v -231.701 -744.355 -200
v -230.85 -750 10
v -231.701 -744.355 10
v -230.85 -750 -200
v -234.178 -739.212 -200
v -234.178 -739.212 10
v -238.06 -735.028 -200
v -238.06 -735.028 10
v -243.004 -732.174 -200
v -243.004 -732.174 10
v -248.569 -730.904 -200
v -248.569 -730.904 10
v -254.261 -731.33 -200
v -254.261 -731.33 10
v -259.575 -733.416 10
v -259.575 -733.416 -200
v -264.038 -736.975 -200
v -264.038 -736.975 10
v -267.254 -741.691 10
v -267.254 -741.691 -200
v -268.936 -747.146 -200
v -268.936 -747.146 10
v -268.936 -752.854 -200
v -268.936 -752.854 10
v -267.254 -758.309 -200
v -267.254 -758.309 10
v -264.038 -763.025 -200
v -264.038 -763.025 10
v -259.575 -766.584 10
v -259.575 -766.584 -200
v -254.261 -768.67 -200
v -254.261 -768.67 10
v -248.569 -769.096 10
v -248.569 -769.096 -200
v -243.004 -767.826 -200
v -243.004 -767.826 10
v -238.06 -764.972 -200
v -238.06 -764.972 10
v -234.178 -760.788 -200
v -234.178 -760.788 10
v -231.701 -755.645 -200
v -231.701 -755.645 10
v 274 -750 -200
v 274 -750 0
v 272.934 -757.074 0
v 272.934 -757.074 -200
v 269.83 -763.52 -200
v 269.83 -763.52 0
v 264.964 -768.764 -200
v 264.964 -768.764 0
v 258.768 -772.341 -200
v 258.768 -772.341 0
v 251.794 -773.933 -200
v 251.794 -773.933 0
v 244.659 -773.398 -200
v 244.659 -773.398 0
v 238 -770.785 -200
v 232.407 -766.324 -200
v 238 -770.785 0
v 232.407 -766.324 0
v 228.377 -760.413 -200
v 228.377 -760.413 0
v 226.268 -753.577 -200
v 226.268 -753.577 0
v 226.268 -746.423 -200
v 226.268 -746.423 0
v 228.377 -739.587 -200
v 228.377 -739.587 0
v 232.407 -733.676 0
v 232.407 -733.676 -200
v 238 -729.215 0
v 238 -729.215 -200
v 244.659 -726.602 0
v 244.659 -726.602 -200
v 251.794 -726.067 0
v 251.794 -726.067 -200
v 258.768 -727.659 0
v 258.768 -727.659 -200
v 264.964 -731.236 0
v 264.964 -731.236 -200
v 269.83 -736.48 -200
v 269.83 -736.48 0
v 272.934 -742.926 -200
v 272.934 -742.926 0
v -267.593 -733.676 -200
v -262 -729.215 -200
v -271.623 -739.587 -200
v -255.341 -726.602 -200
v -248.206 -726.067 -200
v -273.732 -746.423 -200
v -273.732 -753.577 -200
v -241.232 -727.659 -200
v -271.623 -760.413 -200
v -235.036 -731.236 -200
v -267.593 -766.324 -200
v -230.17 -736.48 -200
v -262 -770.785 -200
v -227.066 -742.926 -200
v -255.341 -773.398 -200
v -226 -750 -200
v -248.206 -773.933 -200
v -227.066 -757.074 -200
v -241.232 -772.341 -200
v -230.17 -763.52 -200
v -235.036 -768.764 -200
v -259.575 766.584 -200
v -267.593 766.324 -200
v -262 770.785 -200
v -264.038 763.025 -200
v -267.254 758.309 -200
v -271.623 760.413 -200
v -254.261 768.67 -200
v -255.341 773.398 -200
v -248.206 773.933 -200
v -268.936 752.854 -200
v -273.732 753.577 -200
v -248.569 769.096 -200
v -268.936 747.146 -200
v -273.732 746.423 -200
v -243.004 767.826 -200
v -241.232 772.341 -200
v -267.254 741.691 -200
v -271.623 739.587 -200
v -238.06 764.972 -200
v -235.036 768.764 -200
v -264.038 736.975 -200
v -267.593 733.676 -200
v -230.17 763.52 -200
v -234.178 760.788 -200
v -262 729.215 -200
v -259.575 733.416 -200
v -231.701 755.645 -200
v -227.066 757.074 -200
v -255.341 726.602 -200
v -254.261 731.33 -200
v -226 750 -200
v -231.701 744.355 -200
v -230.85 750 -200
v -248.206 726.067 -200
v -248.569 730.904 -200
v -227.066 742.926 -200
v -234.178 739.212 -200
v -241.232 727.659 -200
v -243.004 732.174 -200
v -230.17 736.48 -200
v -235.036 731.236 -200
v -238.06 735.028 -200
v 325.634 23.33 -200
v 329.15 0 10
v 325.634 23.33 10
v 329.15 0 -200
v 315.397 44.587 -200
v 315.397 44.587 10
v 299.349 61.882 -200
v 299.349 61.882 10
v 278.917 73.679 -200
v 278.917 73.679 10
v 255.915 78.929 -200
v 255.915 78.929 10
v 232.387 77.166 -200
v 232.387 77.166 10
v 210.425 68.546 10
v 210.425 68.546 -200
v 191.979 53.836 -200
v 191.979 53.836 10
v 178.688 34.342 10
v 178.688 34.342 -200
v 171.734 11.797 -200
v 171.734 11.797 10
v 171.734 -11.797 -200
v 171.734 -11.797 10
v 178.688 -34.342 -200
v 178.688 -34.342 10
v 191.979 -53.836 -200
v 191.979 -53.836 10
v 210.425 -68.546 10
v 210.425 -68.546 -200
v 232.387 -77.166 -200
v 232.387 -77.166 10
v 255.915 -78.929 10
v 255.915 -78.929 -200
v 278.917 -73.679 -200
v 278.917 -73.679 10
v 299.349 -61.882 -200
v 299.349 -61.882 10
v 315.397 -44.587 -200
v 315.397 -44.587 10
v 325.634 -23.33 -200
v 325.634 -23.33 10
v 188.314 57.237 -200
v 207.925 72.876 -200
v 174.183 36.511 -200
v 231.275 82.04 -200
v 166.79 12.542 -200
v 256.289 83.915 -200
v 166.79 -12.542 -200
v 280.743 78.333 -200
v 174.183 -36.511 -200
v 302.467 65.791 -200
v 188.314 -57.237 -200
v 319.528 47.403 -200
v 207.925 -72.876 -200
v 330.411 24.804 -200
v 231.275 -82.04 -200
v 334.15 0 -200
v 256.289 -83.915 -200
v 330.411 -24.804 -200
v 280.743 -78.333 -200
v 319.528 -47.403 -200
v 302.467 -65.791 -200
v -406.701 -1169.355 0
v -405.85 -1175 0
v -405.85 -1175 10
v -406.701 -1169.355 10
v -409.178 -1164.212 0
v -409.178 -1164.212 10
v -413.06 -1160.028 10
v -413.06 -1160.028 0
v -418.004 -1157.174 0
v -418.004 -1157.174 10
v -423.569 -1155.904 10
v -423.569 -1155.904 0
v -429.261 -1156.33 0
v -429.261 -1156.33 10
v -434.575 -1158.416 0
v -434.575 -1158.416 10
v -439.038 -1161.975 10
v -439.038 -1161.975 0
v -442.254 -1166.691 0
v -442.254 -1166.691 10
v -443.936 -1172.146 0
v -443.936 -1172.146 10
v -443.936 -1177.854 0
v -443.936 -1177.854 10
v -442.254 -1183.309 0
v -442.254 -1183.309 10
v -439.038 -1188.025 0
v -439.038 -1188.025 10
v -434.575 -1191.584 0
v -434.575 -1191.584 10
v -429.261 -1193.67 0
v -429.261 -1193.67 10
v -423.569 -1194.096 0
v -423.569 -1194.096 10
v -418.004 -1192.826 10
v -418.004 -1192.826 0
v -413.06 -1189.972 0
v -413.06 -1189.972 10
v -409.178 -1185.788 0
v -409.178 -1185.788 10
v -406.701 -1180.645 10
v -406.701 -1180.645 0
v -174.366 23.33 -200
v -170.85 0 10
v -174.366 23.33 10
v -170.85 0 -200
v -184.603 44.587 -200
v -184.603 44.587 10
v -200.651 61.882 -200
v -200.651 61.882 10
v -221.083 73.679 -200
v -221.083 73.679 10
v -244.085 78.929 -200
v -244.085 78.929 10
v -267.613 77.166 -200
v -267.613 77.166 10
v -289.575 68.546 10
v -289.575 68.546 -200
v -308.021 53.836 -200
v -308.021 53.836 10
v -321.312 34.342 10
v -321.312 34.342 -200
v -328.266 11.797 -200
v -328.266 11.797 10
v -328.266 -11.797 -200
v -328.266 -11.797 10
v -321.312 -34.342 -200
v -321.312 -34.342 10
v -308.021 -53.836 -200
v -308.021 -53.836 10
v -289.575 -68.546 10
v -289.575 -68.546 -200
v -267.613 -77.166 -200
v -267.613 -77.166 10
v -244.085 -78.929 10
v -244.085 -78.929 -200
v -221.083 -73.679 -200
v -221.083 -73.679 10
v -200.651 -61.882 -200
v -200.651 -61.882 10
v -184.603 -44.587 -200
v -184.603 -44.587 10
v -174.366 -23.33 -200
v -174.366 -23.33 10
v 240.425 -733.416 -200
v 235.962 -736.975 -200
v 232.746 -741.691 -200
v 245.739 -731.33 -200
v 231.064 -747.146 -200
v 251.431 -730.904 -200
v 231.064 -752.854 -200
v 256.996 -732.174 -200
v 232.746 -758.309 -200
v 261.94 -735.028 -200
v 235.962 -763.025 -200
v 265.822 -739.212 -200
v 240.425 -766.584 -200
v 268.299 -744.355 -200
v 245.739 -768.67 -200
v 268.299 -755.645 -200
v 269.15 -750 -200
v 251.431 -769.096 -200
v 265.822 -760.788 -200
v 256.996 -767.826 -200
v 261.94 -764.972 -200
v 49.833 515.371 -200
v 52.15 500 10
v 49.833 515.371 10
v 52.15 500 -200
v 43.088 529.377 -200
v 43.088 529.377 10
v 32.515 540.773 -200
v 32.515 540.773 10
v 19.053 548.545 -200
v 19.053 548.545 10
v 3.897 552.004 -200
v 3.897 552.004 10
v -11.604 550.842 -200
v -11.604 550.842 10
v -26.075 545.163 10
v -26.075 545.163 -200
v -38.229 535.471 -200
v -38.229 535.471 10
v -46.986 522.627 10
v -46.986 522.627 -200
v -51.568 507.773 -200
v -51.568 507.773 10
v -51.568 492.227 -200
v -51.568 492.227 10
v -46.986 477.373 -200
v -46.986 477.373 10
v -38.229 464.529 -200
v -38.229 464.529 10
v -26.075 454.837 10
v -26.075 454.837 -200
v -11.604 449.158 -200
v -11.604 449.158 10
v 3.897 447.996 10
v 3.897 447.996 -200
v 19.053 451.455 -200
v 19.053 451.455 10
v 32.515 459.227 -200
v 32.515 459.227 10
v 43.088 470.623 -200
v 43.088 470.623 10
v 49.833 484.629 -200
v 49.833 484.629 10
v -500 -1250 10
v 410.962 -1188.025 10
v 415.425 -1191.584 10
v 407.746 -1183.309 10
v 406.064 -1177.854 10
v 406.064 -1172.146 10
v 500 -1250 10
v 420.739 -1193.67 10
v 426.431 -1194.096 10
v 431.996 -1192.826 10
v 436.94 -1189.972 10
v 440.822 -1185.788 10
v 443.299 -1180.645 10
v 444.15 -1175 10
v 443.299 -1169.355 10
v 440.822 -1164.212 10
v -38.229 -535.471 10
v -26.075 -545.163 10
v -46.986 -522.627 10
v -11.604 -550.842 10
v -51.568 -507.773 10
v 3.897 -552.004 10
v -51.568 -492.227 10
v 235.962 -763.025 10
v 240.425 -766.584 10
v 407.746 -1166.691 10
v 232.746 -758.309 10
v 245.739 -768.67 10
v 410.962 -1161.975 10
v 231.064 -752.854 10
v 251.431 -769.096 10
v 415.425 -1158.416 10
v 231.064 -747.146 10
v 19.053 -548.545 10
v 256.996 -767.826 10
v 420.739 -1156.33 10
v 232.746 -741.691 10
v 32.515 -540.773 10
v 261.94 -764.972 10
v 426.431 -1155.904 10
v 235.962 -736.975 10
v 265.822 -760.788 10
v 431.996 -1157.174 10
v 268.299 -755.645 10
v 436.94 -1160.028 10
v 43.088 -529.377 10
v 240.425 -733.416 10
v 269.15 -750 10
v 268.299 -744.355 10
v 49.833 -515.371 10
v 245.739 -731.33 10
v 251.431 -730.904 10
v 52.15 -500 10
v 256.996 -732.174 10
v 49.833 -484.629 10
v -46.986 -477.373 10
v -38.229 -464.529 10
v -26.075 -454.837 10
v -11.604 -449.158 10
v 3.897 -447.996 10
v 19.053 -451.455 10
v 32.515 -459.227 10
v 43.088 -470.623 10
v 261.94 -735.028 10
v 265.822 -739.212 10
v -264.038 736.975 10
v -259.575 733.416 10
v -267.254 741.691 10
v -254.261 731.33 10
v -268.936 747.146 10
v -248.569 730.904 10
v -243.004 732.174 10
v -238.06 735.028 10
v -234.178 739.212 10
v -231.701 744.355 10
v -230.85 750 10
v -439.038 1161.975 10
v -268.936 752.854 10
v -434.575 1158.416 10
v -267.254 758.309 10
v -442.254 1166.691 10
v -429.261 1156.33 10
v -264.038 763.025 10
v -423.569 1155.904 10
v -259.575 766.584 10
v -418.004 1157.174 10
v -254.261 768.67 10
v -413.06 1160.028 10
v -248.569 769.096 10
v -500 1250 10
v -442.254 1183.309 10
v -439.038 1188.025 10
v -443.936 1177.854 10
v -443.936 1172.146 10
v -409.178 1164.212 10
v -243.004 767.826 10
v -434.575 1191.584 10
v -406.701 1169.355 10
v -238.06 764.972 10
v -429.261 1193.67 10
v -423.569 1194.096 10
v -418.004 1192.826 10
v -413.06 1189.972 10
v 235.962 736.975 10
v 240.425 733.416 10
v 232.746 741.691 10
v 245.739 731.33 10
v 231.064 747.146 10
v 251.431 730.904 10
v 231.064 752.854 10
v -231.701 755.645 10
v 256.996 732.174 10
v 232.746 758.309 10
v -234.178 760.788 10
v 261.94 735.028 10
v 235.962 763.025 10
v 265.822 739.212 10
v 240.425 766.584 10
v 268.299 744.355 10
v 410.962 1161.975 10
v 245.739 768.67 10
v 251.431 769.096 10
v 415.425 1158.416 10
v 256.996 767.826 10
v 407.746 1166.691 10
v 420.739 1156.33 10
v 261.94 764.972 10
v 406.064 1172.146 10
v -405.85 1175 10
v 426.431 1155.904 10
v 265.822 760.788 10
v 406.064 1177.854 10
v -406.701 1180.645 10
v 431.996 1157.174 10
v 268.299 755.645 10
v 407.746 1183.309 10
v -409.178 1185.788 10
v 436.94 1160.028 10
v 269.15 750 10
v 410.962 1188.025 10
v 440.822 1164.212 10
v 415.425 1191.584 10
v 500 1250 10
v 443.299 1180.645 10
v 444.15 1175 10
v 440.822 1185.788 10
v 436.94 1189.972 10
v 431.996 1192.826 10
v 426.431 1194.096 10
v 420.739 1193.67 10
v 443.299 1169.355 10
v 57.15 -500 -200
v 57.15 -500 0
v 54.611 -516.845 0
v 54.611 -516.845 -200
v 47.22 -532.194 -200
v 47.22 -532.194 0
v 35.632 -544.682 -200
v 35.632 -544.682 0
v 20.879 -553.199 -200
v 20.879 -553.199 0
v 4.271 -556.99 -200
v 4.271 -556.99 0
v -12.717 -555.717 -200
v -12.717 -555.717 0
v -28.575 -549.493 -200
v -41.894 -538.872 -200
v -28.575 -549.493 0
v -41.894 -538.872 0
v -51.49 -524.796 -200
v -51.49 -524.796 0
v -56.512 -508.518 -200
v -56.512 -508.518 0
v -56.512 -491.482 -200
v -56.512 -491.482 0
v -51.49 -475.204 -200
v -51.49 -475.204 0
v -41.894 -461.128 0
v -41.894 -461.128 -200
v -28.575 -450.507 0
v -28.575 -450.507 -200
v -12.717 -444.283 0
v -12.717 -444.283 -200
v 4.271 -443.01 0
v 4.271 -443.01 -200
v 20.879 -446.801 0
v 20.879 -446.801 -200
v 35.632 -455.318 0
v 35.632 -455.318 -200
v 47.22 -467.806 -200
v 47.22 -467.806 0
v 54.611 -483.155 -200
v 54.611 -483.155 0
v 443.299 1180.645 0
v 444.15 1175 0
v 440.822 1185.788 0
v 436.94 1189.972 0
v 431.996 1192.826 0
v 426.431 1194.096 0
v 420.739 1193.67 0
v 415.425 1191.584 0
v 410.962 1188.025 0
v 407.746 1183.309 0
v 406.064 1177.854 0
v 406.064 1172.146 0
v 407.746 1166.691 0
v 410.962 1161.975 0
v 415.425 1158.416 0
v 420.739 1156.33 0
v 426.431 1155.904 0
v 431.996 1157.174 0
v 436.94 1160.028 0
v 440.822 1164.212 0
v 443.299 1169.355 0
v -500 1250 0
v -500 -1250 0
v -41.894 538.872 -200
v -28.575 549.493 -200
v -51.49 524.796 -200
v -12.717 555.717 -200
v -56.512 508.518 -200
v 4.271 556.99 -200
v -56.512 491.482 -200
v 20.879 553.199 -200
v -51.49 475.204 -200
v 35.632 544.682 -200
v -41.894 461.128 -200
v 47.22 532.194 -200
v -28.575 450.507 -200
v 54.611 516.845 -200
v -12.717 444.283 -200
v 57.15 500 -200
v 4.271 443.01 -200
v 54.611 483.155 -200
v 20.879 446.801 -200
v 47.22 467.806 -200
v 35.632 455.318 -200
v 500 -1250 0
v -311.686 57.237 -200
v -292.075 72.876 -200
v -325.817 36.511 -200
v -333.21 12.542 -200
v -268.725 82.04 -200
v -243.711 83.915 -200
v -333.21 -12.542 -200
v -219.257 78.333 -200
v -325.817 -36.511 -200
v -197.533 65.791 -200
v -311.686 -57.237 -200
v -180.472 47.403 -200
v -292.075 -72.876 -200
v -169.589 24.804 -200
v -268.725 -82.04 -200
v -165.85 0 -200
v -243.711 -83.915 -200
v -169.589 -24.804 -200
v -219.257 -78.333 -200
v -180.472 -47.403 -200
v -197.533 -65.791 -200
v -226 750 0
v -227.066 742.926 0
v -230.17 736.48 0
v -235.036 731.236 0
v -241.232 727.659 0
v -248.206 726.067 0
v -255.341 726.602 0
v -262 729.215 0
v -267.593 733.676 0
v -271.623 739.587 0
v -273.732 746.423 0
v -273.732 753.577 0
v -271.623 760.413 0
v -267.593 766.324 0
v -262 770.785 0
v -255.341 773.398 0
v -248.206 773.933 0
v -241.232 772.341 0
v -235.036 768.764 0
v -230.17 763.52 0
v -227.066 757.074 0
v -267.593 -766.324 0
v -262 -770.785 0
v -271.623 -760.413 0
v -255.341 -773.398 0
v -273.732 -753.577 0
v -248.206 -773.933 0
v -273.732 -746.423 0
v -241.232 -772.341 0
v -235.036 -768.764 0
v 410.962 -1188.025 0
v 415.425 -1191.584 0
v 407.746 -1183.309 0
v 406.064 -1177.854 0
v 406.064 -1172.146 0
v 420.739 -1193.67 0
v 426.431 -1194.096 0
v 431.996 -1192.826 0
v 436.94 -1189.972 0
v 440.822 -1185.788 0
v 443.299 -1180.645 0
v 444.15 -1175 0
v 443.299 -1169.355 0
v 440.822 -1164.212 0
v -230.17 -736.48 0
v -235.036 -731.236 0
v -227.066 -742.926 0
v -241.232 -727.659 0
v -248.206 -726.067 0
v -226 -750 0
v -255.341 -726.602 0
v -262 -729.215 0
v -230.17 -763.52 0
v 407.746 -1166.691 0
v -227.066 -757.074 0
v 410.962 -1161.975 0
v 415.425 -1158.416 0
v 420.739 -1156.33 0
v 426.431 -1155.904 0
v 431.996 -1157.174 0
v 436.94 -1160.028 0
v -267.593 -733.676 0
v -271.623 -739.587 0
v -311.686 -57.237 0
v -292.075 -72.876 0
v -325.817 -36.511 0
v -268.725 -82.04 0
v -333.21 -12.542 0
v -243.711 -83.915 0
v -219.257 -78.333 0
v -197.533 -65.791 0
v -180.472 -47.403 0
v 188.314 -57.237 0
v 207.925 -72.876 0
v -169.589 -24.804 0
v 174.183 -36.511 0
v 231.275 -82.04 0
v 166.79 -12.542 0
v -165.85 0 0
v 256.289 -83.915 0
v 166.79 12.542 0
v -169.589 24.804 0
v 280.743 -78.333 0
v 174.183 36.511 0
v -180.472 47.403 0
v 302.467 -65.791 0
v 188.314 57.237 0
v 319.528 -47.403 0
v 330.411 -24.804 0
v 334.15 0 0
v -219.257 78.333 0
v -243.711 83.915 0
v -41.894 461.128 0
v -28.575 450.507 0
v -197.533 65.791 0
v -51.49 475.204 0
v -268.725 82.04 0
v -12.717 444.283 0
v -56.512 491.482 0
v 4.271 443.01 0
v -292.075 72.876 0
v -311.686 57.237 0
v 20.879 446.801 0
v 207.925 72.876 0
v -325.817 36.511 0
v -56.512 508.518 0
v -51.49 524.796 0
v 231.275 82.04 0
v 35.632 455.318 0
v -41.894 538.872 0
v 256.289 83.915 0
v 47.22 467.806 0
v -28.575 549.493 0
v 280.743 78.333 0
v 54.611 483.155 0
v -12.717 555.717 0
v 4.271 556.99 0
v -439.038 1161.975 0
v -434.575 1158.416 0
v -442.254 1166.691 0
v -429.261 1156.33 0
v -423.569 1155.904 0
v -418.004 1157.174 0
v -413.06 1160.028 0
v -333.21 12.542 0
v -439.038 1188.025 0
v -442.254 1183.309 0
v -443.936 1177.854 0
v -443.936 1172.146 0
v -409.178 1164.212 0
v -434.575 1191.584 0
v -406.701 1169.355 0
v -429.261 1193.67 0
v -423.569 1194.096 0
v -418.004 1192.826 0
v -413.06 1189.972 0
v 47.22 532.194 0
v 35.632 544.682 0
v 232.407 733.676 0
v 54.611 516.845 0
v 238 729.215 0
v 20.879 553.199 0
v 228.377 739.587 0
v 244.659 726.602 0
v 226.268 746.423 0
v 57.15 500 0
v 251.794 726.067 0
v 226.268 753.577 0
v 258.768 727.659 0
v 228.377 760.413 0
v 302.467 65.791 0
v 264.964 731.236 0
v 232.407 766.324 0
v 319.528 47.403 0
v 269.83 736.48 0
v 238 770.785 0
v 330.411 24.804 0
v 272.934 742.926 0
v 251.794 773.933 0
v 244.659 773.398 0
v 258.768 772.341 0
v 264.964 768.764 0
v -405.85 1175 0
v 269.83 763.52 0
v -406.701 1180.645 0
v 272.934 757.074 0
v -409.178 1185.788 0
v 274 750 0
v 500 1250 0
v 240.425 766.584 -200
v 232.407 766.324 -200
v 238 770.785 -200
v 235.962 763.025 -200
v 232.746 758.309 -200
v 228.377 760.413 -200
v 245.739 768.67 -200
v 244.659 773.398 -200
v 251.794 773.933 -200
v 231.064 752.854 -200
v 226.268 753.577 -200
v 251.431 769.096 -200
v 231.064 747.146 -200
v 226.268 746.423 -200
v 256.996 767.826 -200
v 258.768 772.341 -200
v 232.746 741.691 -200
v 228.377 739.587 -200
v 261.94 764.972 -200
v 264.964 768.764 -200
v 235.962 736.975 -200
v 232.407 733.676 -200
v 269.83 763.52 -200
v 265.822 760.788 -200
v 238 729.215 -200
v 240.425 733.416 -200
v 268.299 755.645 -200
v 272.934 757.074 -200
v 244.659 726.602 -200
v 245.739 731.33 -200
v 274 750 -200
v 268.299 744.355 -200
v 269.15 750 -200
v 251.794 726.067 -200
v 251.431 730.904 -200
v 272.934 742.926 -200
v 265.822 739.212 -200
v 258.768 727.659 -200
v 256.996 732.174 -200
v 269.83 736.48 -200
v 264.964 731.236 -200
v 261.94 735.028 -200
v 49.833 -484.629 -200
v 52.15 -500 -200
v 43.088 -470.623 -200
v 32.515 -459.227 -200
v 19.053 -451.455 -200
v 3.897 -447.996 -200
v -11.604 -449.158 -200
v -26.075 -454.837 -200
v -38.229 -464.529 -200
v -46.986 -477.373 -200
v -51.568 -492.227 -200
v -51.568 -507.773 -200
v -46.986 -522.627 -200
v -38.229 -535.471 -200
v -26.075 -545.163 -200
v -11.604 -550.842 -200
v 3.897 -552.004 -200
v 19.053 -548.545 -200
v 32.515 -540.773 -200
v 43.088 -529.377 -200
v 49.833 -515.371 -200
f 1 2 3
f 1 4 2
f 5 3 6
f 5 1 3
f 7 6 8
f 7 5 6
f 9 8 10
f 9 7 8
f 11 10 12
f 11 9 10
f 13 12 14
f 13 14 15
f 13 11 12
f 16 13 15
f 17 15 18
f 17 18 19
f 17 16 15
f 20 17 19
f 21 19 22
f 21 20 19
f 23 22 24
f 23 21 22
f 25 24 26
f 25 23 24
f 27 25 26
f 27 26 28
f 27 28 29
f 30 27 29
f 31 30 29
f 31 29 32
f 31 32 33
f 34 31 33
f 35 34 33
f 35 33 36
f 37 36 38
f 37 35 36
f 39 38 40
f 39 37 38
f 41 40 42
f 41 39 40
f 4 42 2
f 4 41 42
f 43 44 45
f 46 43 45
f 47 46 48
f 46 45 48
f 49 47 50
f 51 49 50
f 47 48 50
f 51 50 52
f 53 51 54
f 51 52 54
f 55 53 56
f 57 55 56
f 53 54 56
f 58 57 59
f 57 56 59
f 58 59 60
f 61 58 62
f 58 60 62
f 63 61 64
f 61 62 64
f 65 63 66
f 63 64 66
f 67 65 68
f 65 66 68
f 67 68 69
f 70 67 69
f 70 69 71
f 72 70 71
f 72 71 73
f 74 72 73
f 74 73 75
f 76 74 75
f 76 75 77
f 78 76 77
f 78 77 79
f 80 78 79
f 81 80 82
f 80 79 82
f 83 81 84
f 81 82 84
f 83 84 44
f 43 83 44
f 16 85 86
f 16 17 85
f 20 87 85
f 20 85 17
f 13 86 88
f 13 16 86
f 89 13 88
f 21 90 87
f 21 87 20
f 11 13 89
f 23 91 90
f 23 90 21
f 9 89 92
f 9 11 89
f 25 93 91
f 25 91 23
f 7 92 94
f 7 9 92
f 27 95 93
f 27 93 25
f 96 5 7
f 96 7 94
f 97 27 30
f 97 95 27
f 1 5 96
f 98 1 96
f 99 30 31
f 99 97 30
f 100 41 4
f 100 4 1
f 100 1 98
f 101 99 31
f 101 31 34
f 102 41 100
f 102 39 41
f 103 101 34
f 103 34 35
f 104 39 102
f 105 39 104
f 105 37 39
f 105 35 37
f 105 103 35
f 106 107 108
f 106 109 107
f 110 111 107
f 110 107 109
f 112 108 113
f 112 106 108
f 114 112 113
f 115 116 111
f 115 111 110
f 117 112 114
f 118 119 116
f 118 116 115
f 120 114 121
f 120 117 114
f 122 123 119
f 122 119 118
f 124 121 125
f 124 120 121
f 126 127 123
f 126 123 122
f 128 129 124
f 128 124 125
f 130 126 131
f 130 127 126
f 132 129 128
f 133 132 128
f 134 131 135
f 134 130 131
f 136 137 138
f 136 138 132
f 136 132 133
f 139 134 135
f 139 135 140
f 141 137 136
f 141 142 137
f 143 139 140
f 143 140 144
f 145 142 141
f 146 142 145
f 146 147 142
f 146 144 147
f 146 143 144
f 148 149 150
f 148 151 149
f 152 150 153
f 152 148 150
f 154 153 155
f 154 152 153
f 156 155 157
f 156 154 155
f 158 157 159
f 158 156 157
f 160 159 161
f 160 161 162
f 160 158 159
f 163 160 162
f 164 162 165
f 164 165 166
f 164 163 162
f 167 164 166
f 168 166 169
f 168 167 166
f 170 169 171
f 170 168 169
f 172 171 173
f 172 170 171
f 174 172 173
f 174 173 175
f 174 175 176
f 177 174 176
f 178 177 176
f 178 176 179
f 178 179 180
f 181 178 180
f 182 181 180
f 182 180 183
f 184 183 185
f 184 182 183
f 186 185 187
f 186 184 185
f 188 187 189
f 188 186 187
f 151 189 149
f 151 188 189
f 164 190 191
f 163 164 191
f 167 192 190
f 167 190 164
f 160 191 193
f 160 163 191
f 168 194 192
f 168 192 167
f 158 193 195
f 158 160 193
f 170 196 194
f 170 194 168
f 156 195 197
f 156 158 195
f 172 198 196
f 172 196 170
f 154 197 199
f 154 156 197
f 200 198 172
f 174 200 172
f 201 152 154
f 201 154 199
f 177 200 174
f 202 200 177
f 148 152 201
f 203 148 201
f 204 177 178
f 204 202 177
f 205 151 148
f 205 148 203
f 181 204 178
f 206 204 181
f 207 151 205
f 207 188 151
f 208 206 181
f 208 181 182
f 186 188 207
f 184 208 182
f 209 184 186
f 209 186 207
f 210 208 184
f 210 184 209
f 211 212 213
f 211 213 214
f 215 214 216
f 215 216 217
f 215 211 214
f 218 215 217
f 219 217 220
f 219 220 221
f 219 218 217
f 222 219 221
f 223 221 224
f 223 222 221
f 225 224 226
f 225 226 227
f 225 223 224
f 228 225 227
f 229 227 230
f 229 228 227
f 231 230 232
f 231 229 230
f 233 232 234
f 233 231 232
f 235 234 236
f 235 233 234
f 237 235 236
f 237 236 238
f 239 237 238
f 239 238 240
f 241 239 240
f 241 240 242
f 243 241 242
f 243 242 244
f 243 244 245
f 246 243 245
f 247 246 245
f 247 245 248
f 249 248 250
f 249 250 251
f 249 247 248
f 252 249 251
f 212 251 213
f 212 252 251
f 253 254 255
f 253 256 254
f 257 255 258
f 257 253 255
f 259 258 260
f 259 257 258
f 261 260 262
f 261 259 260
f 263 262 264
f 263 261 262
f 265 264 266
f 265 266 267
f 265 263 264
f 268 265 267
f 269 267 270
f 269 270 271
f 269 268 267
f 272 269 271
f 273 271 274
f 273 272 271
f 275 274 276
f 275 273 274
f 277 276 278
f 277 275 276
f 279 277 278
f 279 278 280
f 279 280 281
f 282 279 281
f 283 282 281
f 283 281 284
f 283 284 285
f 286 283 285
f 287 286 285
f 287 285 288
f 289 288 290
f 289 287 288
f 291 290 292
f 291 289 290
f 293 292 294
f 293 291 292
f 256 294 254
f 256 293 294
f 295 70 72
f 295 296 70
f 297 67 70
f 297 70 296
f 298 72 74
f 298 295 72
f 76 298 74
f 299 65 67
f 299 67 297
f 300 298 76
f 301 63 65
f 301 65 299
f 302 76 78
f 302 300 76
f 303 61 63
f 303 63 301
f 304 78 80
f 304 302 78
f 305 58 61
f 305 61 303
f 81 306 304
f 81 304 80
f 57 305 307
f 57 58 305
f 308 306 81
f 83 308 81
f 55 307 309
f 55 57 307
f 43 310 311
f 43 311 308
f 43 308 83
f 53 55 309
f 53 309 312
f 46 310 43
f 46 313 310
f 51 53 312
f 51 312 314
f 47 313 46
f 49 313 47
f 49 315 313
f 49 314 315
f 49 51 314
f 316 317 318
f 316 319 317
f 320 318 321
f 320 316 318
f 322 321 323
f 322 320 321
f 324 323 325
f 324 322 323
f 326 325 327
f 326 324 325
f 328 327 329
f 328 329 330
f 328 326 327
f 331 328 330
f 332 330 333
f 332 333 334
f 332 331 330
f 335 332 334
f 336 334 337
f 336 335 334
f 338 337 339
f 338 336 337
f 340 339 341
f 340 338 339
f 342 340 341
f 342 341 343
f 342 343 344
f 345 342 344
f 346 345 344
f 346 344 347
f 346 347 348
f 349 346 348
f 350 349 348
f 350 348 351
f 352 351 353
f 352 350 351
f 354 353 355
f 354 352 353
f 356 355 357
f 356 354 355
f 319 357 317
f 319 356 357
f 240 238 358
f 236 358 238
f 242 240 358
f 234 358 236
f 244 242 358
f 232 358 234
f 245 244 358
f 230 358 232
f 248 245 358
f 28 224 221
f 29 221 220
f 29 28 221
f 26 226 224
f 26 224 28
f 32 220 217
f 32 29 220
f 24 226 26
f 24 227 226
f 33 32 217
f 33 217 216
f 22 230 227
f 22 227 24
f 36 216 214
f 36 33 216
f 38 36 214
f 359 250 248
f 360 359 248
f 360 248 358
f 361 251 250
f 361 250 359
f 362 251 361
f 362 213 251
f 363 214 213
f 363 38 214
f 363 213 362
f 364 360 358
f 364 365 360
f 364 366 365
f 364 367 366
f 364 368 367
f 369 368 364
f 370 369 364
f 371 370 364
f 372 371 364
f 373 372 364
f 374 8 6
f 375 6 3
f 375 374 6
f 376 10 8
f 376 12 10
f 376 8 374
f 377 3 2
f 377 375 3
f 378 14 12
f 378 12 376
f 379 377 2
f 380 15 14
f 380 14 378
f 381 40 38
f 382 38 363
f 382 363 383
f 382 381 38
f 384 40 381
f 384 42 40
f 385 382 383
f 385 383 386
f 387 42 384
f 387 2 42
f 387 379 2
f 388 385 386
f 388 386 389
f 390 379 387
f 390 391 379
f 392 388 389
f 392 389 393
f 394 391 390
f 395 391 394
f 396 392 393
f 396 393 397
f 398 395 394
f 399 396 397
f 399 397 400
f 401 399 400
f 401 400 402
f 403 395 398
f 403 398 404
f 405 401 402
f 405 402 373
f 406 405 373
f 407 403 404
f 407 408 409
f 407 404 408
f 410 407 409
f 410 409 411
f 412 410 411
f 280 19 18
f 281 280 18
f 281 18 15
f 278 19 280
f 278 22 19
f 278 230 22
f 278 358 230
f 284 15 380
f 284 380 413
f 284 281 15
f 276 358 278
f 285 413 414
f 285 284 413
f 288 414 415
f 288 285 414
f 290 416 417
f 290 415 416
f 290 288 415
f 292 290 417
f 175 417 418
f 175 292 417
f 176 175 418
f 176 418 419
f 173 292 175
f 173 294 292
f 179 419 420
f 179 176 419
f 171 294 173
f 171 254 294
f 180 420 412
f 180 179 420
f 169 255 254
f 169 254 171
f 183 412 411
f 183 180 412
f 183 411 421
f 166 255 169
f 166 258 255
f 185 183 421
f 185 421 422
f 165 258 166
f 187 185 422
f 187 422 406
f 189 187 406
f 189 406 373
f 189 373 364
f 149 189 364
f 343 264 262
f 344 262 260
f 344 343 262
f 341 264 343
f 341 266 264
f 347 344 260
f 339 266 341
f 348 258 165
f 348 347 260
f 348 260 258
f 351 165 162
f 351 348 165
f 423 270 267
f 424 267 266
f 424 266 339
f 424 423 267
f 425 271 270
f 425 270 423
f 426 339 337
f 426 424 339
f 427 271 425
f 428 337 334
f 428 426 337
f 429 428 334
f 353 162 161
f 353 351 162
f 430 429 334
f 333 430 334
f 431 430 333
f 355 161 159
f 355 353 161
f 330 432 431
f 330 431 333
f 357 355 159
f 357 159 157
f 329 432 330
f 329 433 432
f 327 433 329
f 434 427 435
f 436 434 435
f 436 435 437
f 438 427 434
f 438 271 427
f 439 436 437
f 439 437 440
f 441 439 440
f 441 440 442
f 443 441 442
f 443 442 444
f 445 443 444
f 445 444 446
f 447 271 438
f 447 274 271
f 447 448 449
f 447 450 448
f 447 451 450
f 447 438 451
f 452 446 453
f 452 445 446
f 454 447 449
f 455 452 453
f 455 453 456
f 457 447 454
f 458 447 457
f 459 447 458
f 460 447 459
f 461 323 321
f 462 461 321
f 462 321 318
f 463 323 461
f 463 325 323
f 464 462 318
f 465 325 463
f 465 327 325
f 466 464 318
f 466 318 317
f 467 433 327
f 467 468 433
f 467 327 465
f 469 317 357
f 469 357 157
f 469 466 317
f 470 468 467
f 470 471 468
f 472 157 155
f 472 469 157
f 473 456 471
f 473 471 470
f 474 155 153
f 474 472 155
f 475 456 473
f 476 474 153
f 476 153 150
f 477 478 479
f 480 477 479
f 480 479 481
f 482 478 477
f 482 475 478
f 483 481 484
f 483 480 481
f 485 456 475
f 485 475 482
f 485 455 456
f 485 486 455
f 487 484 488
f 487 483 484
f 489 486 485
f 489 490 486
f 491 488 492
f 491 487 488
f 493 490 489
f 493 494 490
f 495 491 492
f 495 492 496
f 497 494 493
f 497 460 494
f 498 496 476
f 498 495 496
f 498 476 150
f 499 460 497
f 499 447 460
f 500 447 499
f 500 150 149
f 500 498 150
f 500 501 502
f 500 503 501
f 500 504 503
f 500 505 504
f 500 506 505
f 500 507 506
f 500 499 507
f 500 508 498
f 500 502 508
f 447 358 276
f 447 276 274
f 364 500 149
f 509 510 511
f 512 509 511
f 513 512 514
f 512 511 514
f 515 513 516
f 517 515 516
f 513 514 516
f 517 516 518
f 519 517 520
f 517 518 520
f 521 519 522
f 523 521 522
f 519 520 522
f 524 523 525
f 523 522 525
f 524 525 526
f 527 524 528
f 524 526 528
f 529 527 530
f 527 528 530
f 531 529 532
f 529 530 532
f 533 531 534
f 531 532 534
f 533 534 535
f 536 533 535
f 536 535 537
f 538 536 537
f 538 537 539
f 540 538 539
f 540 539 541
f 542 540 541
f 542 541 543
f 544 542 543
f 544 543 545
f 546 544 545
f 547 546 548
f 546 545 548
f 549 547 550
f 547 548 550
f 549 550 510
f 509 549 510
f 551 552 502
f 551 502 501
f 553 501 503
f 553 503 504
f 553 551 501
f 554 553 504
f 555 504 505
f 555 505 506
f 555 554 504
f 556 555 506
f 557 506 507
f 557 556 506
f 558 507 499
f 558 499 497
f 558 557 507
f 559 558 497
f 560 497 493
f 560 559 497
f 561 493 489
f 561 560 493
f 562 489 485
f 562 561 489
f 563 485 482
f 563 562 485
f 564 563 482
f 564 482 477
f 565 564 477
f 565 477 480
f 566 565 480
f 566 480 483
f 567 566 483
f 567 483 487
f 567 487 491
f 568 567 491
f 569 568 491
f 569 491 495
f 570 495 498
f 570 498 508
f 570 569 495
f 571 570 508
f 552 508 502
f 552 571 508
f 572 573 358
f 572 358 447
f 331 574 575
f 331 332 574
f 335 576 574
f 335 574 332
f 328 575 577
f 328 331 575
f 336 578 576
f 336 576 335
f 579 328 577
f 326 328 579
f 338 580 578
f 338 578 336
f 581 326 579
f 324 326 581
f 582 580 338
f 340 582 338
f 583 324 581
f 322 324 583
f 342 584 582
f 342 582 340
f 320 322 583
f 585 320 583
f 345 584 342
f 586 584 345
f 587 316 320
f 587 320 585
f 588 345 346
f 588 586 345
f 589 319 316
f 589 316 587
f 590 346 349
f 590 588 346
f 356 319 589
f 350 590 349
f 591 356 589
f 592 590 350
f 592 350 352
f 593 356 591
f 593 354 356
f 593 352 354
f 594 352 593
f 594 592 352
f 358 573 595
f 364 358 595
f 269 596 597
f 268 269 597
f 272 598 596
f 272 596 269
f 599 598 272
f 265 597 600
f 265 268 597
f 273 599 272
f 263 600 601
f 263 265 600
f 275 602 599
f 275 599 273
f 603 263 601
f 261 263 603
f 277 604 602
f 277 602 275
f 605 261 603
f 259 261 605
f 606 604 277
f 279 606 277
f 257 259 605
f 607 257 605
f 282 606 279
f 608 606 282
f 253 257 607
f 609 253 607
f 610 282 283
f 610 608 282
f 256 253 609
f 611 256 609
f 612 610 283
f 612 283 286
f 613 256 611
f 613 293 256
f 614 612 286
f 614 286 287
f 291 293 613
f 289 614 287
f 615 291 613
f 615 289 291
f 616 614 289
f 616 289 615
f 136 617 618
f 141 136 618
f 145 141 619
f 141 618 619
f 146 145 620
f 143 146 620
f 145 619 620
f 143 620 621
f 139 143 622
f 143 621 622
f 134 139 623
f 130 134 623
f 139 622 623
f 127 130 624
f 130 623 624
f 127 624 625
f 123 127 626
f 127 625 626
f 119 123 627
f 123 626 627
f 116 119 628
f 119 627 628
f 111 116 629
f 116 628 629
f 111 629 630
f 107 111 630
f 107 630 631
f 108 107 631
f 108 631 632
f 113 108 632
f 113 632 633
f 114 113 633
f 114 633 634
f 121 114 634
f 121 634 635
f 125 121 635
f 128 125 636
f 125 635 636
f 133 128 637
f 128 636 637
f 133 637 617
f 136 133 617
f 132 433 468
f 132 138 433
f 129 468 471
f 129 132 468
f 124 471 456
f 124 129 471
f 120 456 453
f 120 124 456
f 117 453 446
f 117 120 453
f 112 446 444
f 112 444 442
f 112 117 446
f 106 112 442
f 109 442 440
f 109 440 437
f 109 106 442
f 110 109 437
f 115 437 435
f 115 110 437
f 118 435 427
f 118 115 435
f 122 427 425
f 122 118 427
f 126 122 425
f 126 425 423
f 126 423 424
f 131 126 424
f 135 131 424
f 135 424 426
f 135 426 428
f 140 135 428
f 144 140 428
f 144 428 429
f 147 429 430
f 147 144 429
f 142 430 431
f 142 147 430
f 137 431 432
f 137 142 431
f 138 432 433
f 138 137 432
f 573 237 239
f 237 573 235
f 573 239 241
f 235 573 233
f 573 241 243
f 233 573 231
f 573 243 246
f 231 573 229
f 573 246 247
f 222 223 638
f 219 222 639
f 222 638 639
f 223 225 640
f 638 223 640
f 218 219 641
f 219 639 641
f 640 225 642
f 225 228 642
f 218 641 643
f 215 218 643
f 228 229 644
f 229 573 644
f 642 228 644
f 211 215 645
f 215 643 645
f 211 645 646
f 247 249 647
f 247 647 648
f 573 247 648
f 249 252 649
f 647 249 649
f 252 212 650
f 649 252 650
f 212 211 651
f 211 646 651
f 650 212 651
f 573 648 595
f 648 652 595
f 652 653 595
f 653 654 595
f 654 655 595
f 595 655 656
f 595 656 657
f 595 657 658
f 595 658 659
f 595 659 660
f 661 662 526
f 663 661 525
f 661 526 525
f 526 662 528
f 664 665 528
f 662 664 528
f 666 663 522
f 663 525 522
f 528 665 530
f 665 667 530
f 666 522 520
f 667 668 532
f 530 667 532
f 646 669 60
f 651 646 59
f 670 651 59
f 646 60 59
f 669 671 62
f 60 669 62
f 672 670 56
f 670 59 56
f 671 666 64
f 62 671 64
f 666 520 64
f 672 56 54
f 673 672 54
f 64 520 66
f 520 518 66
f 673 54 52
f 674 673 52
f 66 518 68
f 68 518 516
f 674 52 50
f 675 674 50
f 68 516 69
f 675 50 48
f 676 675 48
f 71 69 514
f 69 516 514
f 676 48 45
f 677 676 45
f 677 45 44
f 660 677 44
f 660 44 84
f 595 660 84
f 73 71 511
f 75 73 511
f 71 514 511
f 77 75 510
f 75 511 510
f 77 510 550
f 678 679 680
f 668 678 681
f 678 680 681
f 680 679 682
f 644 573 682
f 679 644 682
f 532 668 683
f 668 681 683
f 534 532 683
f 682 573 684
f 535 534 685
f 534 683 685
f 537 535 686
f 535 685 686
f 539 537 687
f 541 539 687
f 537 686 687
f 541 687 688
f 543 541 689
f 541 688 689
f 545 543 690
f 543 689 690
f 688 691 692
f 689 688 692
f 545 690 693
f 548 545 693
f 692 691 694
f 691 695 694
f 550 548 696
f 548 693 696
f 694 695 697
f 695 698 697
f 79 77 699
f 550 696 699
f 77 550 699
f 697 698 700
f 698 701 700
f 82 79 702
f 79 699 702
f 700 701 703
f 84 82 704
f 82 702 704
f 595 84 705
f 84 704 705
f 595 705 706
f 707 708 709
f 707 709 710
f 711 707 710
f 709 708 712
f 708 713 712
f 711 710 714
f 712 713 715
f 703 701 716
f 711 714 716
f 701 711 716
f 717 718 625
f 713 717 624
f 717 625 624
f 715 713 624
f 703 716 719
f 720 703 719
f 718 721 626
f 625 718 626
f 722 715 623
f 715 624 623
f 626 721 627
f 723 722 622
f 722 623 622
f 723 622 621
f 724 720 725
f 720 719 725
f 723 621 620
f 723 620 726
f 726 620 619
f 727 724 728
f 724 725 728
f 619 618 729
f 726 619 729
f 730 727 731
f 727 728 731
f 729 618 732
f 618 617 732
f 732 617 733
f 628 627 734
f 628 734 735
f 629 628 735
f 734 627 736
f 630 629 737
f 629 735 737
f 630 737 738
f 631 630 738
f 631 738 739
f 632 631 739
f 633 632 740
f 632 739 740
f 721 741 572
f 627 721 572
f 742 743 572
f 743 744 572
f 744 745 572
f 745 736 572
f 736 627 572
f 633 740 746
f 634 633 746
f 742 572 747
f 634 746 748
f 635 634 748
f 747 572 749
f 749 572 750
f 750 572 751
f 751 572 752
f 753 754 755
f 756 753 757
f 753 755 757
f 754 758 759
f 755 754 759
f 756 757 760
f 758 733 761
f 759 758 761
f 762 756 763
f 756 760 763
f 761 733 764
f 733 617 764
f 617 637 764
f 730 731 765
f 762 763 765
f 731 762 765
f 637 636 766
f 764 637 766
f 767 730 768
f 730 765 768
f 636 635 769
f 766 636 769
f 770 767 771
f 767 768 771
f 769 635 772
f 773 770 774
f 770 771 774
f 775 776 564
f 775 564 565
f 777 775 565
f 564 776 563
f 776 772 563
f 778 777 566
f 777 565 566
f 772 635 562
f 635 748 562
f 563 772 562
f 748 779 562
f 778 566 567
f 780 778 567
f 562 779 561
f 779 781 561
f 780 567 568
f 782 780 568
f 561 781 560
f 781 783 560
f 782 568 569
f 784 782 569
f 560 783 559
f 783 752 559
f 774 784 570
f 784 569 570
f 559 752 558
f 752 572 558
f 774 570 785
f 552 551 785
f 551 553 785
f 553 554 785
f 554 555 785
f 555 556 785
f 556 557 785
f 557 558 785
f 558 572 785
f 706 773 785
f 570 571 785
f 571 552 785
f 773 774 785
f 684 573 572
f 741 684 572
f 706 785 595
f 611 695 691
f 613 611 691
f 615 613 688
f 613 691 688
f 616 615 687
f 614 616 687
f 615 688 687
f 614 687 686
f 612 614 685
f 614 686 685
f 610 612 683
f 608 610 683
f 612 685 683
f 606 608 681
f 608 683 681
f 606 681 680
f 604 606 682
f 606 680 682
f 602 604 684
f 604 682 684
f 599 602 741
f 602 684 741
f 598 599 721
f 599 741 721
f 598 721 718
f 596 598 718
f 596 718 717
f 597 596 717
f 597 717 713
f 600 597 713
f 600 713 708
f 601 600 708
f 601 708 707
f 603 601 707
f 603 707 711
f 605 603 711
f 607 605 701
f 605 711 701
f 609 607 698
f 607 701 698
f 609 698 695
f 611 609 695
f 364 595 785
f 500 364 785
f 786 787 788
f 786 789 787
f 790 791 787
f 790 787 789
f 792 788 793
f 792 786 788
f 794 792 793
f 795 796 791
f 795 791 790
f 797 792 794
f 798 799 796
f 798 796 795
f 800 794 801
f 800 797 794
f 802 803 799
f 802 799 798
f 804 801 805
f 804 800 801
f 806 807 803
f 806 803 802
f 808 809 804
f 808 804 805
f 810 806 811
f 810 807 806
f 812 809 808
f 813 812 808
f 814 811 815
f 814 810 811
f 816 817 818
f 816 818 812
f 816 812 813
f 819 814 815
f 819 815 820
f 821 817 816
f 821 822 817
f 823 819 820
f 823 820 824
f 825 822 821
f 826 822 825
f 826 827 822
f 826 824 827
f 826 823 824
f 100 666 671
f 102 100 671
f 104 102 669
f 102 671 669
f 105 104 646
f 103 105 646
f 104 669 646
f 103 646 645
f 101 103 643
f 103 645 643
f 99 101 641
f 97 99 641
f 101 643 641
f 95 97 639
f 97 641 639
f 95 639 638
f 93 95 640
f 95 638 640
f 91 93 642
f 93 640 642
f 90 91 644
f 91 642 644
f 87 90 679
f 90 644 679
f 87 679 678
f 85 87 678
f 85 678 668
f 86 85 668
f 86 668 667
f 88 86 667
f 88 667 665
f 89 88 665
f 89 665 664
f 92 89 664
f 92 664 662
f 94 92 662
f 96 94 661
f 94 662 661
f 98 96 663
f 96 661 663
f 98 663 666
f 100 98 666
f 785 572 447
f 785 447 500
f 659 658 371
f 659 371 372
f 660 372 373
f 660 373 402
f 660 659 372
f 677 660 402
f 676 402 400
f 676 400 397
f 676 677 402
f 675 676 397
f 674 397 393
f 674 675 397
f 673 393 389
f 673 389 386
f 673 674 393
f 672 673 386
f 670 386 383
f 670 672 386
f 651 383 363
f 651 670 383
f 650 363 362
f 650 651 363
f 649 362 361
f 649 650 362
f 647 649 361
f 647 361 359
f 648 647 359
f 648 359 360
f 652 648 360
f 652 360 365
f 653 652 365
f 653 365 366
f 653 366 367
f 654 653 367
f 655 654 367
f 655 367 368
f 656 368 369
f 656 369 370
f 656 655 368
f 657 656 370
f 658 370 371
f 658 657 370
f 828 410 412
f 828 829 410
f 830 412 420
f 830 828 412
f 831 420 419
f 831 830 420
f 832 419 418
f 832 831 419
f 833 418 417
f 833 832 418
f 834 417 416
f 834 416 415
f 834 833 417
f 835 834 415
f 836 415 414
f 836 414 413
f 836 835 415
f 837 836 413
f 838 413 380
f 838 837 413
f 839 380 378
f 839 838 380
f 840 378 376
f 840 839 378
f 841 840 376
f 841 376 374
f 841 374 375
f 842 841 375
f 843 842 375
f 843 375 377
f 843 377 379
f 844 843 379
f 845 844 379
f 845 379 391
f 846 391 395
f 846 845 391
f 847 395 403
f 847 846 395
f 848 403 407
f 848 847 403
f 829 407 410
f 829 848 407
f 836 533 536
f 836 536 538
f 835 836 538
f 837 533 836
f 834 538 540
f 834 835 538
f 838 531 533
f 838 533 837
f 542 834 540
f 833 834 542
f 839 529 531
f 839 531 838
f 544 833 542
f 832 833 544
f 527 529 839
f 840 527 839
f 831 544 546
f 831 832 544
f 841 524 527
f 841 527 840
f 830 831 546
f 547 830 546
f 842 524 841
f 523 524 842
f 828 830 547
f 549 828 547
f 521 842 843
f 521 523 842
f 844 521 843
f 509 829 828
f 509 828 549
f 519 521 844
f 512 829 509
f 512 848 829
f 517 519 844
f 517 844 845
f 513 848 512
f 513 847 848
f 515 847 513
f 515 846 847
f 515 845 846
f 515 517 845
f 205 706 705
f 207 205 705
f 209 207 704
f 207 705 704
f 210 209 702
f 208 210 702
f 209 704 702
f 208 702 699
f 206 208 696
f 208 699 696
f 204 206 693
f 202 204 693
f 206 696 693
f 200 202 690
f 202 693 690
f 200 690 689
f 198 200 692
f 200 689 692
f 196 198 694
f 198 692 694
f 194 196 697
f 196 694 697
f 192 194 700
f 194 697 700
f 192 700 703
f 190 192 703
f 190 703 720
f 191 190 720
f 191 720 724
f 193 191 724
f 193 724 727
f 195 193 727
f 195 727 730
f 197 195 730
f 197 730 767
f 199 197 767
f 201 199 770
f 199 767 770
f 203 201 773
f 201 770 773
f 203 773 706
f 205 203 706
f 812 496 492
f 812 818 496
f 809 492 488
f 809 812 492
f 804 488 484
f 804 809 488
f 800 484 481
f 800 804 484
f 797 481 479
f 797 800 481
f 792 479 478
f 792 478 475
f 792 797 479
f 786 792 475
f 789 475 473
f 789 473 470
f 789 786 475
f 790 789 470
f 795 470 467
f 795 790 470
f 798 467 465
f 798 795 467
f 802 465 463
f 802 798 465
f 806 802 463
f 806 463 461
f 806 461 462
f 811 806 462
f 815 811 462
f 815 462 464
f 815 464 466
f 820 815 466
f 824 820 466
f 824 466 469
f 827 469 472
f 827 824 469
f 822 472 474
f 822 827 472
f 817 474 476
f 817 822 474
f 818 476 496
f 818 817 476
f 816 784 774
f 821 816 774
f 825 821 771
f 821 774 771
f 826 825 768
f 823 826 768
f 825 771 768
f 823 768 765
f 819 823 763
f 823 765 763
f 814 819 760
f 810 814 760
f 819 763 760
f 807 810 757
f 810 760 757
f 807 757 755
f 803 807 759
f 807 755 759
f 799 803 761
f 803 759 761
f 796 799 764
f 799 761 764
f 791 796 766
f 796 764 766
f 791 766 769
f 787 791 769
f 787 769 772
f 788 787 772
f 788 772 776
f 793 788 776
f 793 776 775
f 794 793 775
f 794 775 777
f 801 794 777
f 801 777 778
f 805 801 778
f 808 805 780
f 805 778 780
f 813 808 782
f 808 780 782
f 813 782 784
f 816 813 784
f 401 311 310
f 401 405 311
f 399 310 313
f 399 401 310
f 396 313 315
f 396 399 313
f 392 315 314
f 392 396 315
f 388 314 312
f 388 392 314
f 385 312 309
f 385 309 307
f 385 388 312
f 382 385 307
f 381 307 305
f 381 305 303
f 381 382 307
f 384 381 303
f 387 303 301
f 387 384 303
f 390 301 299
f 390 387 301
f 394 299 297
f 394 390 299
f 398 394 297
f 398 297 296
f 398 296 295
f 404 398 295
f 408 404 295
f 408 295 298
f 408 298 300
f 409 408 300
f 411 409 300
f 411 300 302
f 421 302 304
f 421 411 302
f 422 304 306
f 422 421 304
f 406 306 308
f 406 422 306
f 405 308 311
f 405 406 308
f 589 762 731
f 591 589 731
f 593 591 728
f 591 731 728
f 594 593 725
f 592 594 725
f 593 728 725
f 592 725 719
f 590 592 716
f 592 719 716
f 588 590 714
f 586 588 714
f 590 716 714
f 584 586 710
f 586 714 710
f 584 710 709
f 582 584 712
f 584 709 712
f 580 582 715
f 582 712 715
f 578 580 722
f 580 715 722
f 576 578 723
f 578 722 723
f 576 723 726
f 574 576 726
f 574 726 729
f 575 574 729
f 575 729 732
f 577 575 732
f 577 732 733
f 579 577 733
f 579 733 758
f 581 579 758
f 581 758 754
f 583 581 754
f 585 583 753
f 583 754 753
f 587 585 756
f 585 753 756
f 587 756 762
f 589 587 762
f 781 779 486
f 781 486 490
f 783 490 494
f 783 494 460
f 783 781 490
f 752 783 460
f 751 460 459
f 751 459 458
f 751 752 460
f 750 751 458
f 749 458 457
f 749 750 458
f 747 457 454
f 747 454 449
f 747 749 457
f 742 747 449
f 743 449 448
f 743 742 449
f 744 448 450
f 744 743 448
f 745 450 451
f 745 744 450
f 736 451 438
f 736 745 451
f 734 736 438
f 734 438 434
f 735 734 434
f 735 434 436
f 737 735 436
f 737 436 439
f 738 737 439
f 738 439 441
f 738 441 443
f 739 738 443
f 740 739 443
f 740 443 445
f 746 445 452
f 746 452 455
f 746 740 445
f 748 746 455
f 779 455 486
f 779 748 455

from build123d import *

# Parameters (mm, degrees)
F0_W     = 1000
F0_H     = 2500
F0_R     = 19.15
F0_R_2   = 52.15
F0_R_3   = 79.15
F1_DEPTH = 10
F2_R     = 24
F2_R_2   = 19.15
F2_R_3   = 57.15
F2_R_4   = 52.15
F2_R_5   = 84.15
F2_R_6   = 79.15
F3_DEPTH = 200


with BuildPart() as f1:
    # F0 (on Top) → F1 (new body)
    with BuildSketch(Plane.XY):
        Rectangle(F0_W, F0_H)
        with Locations((-425, -1175)):
            Circle(F0_R, mode=Mode.SUBTRACT)
        with Locations((-250, -750)):
            Circle(F0_R, mode=Mode.SUBTRACT)
        with Locations((425, -1175)):
            Circle(F0_R, mode=Mode.SUBTRACT)
        with Locations((250, -750)):
            Circle(F0_R, mode=Mode.SUBTRACT)
        with Locations((0, -500)):
            Circle(F0_R_2, mode=Mode.SUBTRACT)
        with Locations((-250, 0)):
            Circle(F0_R_3, mode=Mode.SUBTRACT)
        with Locations((-425, 1175)):
            Circle(F0_R, mode=Mode.SUBTRACT)
        with Locations((-250, 750)):
            Circle(F0_R, mode=Mode.SUBTRACT)
        with Locations((0, 500)):
            Circle(F0_R_2, mode=Mode.SUBTRACT)
        with Locations((250, 0)):
            Circle(F0_R_3, mode=Mode.SUBTRACT)
        with Locations((250, 750)):
            Circle(F0_R, mode=Mode.SUBTRACT)
        with Locations((425, 1175)):
            Circle(F0_R, mode=Mode.SUBTRACT)
    extrude(amount=F1_DEPTH)

    # F2 (on face) → F3 (join)
    with BuildSketch(Plane(origin=(0, 0, 0), x_dir=(1, 0, 0), z_dir=(0, 0, -1))):
        with Locations((250, 750)):
            Circle(F2_R)
        with Locations((250, 750)):
            Circle(F2_R_2, mode=Mode.SUBTRACT)
        with Locations((-250, 750)):
            Circle(F2_R)
        with Locations((-250, 750)):
            Circle(F2_R_2, mode=Mode.SUBTRACT)
        with Locations((0, 500)):
            Circle(F2_R_3)
        with Locations((0, 500)):
            Circle(F2_R_4, mode=Mode.SUBTRACT)
        with Locations((250, 0)):
            Circle(F2_R_5)
        with Locations((250, 0)):
            Circle(F2_R_6, mode=Mode.SUBTRACT)
        with Locations((0, -500)):
            Circle(F2_R_3)
        with Locations((0, -500)):
            Circle(F2_R_4, mode=Mode.SUBTRACT)
        with Locations((250, -750)):
            Circle(F2_R)
        with Locations((250, -750)):
            Circle(F2_R_2, mode=Mode.SUBTRACT)
        with Locations((-250, -750)):
            Circle(F2_R)
        with Locations((-250, -750)):
            Circle(F2_R_2, mode=Mode.SUBTRACT)
        with Locations((-250, 0)):
            Circle(F2_R_5)
        with Locations((-250, 0)):
            Circle(F2_R_6, mode=Mode.SUBTRACT)
    extrude(amount=F3_DEPTH)


solid = f1.part
